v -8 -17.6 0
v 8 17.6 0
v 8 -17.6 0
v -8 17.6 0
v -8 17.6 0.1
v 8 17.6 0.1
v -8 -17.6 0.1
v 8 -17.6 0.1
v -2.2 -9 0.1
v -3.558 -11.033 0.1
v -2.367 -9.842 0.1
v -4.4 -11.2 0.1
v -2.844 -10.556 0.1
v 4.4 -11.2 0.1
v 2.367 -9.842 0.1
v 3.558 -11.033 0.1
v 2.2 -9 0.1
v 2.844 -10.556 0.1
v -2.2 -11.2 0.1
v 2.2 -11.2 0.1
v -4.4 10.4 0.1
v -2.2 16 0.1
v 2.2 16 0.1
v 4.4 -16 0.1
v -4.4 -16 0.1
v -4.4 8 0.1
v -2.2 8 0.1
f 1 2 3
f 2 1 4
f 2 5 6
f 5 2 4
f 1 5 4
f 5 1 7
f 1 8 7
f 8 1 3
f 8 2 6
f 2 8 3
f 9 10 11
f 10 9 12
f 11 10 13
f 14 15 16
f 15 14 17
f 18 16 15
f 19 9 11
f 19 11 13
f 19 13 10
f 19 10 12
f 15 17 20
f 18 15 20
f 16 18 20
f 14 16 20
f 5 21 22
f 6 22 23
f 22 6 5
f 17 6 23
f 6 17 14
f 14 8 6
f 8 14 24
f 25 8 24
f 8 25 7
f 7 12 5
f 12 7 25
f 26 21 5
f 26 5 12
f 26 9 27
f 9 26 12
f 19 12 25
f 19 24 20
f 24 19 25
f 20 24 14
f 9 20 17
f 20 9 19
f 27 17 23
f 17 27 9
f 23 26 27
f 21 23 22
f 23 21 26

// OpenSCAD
// file: ../p/4-4edge.scad
use <../lib.scad>
$fa=1; $fs=0.2;
function ldraw_lib__4_4edge(realsolid=false) = [
// 0 Circle 1.0
// 0 Name: 4-4edge.dat
// 0 Author: James Jessiman
// 0 !LDRAW_ORG Primitive UPDATE 2017-01
// 0 !LICENSE Licensed under CC BY 2.0 and CC BY 4.0 : see CAreadme.txt
// 
// 0 BFC CERTIFY CCW
  [0,"BFC","CERTIFY"],
  [0,"BFC","CCW"],
// 
// 0 !HISTORY 1998-12-15 [PTadmin] Official Update 1998-10
// 0 !HISTORY 2005-12-28 [PTadmin] Official Update 2005-01
// 0 !HISTORY 2007-06-24 [PTadmin] Header formatted for Contributor Agreement
// 0 !HISTORY 2008-07-01 [PTadmin] Official Update 2008-01
// 0 !HISTORY 2017-01-15 [Steffen] BFCed
// 0 !HISTORY 2017-12-30 [PTadmin] Official Update 2017-01
// 
// 
// 2 24 1 0 0 0.9239 0 0.3827
  [2,24,1,0,0,0.9239,0,0.3827],
// 2 24 0.9239 0 0.3827 0.7071 0 0.7071
  [2,24,0.9239,0,0.3827,0.7071,0,0.7071],
// 2 24 0.7071 0 0.7071 0.3827 0 0.9239
  [2,24,0.7071,0,0.7071,0.3827,0,0.9239],
// 2 24 0.3827 0 0.9239 0 0 1
  [2,24,0.3827,0,0.9239,0,0,1],
// 2 24 0 0 1 -0.3827 0 0.9239
  [2,24,0,0,1,-0.3827,0,0.9239],
// 2 24 -0.3827 0 0.9239 -0.7071 0 0.7071
  [2,24,-0.3827,0,0.9239,-0.7071,0,0.7071],
// 2 24 -0.7071 0 0.7071 -0.9239 0 0.3827
  [2,24,-0.7071,0,0.7071,-0.9239,0,0.3827],
// 2 24 -0.9239 0 0.3827 -1 0 -0
  [2,24,-0.9239,0,0.3827,-1,0,-0],
// 2 24 -1 0 -0 -0.9239 0 -0.3827
  [2,24,-1,0,-0,-0.9239,0,-0.3827],
// 2 24 -0.9239 0 -0.3827 -0.7071 0 -0.7071
  [2,24,-0.9239,0,-0.3827,-0.7071,0,-0.7071],
// 2 24 -0.7071 0 -0.7071 -0.3827 0 -0.9239
  [2,24,-0.7071,0,-0.7071,-0.3827,0,-0.9239],
// 2 24 -0.3827 0 -0.9239 0 0 -1
  [2,24,-0.3827,0,-0.9239,0,0,-1],
// 2 24 0 0 -1 0.3827 0 -0.9239
  [2,24,0,0,-1,0.3827,0,-0.9239],
// 2 24 0.3827 0 -0.9239 0.7071 0 -0.7071
  [2,24,0.3827,0,-0.9239,0.7071,0,-0.7071],
// 2 24 0.7071 0 -0.7071 0.9239 0 -0.3827
  [2,24,0.7071,0,-0.7071,0.9239,0,-0.3827],
// 2 24 0.9239 0 -0.3827 1 0 0
  [2,24,0.9239,0,-0.3827,1,0,0],
];
module ldraw_lib__4_4edge(step=0, col=false, unit=2/5, alt=false, line=0.2, solid=!$preview)
    makepoly(ldraw_lib__4_4edge(solid), step=step, col=col, unit=unit, alt=alt, line=line, solid=solid);
ldraw_lib__4_4edge(line=0.2);
// file: ../p/4-4disc.scad
use <../lib.scad>
$fa=1; $fs=0.2;
function ldraw_lib__4_4disc(realsolid=false) = [
// 0 Disc 1.0
// 0 Name: 4-4disc.dat
// 0 Author: James Jessiman
// 0 !LDRAW_ORG Primitive UPDATE 2002-02
// 0 !LICENSE Licensed under CC BY 2.0 and CC BY 4.0 : see CAreadme.txt
// 
// 0 BFC CERTIFY CCW
  [0,"BFC","CERTIFY"],
  [0,"BFC","CCW"],
// 
// 0 !HISTORY 1998-12-15 [PTadmin] Official Update 1998-10
// 0 !HISTORY 2002-03-23 [sbliss] Added BFC statement
// 0 !HISTORY 2002-04-25 [PTadmin] Official Update 2002-02
// 0 !HISTORY 2007-06-24 [PTadmin] Header formatted for Contributor Agreement
// 0 !HISTORY 2008-07-01 [PTadmin] Official Update 2008-01
// 
// 
// 3 16 0 0 0 1 0 0 0.9239 0 0.3827
  [3,16,0,0,0,1,0,0,0.9239,0,0.3827],
// 3 16 0 0 0 0.9239 0 0.3827 0.7071 0 0.7071
  [3,16,0,0,0,0.9239,0,0.3827,0.7071,0,0.7071],
// 3 16 0 0 0 0.7071 0 0.7071 0.3827 0 0.9239
  [3,16,0,0,0,0.7071,0,0.7071,0.3827,0,0.9239],
// 3 16 0 0 0 0.3827 0 0.9239 0 0 1
  [3,16,0,0,0,0.3827,0,0.9239,0,0,1],
// 3 16 0 0 0 0 0 1 -0.3827 0 0.9239
  [3,16,0,0,0,0,0,1,-0.3827,0,0.9239],
// 3 16 0 0 0 -0.3827 0 0.9239 -0.7071 0 0.7071
  [3,16,0,0,0,-0.3827,0,0.9239,-0.7071,0,0.7071],
// 3 16 0 0 0 -0.7071 0 0.7071 -0.9239 0 0.3827
  [3,16,0,0,0,-0.7071,0,0.7071,-0.9239,0,0.3827],
// 3 16 0 0 0 -0.9239 0 0.3827 -1 0 -0
  [3,16,0,0,0,-0.9239,0,0.3827,-1,0,-0],
// 3 16 0 0 0 -1 0 -0 -0.9239 0 -0.3827
  [3,16,0,0,0,-1,0,-0,-0.9239,0,-0.3827],
// 3 16 0 0 0 -0.9239 0 -0.3827 -0.7071 0 -0.7071
  [3,16,0,0,0,-0.9239,0,-0.3827,-0.7071,0,-0.7071],
// 3 16 0 0 0 -0.7071 0 -0.7071 -0.3827 0 -0.9239
  [3,16,0,0,0,-0.7071,0,-0.7071,-0.3827,0,-0.9239],
// 3 16 0 0 0 -0.3827 0 -0.9239 0 0 -1
  [3,16,0,0,0,-0.3827,0,-0.9239,0,0,-1],
// 3 16 0 0 0 0 0 -1 0.3827 0 -0.9239
  [3,16,0,0,0,0,0,-1,0.3827,0,-0.9239],
// 3 16 0 0 0 0.3827 0 -0.9239 0.7071 0 -0.7071
  [3,16,0,0,0,0.3827,0,-0.9239,0.7071,0,-0.7071],
// 3 16 0 0 0 0.7071 0 -0.7071 0.9239 0 -0.3827
  [3,16,0,0,0,0.7071,0,-0.7071,0.9239,0,-0.3827],
// 3 16 0 0 0 0.9239 0 -0.3827 1 0 0
  [3,16,0,0,0,0.9239,0,-0.3827,1,0,0],
// 0
];
module ldraw_lib__4_4disc(step=0, col=false, unit=2/5, alt=false, line=0.2, solid=!$preview)
    makepoly(ldraw_lib__4_4disc(solid), step=step, col=col, unit=unit, alt=alt, line=line, solid=solid);
ldraw_lib__4_4disc(line=0.2);
// file: ../p/4-4cyli.scad
use <../lib.scad>
$fa=1; $fs=0.2;
function ldraw_lib__4_4cyli(realsolid=false) = [
// 0 Cylinder 1.0
// 0 Name: 4-4cyli.dat
// 0 Author: James Jessiman
// 0 !LDRAW_ORG Primitive UPDATE 2005-01
// 0 !LICENSE Licensed under CC BY 2.0 and CC BY 4.0 : see CAreadme.txt
// 
// 0 BFC CERTIFY CCW
  [0,"BFC","CERTIFY"],
  [0,"BFC","CCW"],
// 
// 0 !HISTORY 1998-12-15 [PTadmin] Official Update 1998-10
// 0 !HISTORY 2002-03-23 [sbliss] Added BFC statement; merged headers from files in distributions LDraw 0.27 and Complete.
// 0 !HISTORY 2002-04-25 [PTadmin] Official Update 2002-02
// 0 !HISTORY 2004-12-14 [guyvivan] BFC CCW
// 0 !HISTORY 2005-12-28 [PTadmin] Official Update 2005-01
// 0 !HISTORY 2007-06-24 [PTadmin] Header formatted for Contributor Agreement
// 0 !HISTORY 2008-07-01 [PTadmin] Official Update 2008-01
// 
// 
// 4 16 1 1 0 0.9239 1 0.3827 0.9239 0 0.3827 1 0 0
  [4,16,1,1,0,0.9239,1,0.3827,0.9239,0,0.3827,1,0,0],
// 5 24 1 0 0 1 1 0 0.9239 0 0.3827 0.9239 0 -0.3827
  [5,24,1,0,0,1,1,0,0.9239,0,0.3827,0.9239,0,-0.3827],
// 4 16 0.9239 1 0.3827 0.7071 1 0.7071 0.7071 0 0.7071 0.9239 0 0.3827
  [4,16,0.9239,1,0.3827,0.7071,1,0.7071,0.7071,0,0.7071,0.9239,0,0.3827],
// 5 24 0.9239 0 0.3827 0.9239 1 0.3827 0.7071 0 0.7071 1 0 0
  [5,24,0.9239,0,0.3827,0.9239,1,0.3827,0.7071,0,0.7071,1,0,0],
// 4 16 0.7071 1 0.7071 0.3827 1 0.9239 0.3827 0 0.9239 0.7071 0 0.7071
  [4,16,0.7071,1,0.7071,0.3827,1,0.9239,0.3827,0,0.9239,0.7071,0,0.7071],
// 5 24 0.7071 0 0.7071 0.7071 1 0.7071 0.3827 0 0.9239 0.9239 0 0.3827
  [5,24,0.7071,0,0.7071,0.7071,1,0.7071,0.3827,0,0.9239,0.9239,0,0.3827],
// 4 16 0.3827 1 0.9239 0 1 1 0 0 1 0.3827 0 0.9239
  [4,16,0.3827,1,0.9239,0,1,1,0,0,1,0.3827,0,0.9239],
// 5 24 0.3827 0 0.9239 0.3827 1 0.9239 0 0 1 0.7071 0 0.7071
  [5,24,0.3827,0,0.9239,0.3827,1,0.9239,0,0,1,0.7071,0,0.7071],
// 4 16 0 1 1 -0.3827 1 0.9239 -0.3827 0 0.9239 0 0 1
  [4,16,0,1,1,-0.3827,1,0.9239,-0.3827,0,0.9239,0,0,1],
// 5 24 0 0 1 0 1 1 -0.3827 0 0.9239 0.3827 0 0.9239
  [5,24,0,0,1,0,1,1,-0.3827,0,0.9239,0.3827,0,0.9239],
// 4 16 -0.3827 1 0.9239 -0.7071 1 0.7071 -0.7071 0 0.7071 -0.3827 0 0.9239
  [4,16,-0.3827,1,0.9239,-0.7071,1,0.7071,-0.7071,0,0.7071,-0.3827,0,0.9239],
// 5 24 -0.3827 0 0.9239 -0.3827 1 0.9239 -0.7071 0 0.7071 0 0 1
  [5,24,-0.3827,0,0.9239,-0.3827,1,0.9239,-0.7071,0,0.7071,0,0,1],
// 4 16 -0.7071 1 0.7071 -0.9239 1 0.3827 -0.9239 0 0.3827 -0.7071 0 0.7071
  [4,16,-0.7071,1,0.7071,-0.9239,1,0.3827,-0.9239,0,0.3827,-0.7071,0,0.7071],
// 5 24 -0.7071 0 0.7071 -0.7071 1 0.7071 -0.9239 0 0.3827 -0.3827 0 0.9239
  [5,24,-0.7071,0,0.7071,-0.7071,1,0.7071,-0.9239,0,0.3827,-0.3827,0,0.9239],
// 4 16 -0.9239 1 0.3827 -1 1 0 -1 0 0 -0.9239 0 0.3827
  [4,16,-0.9239,1,0.3827,-1,1,0,-1,0,0,-0.9239,0,0.3827],
// 5 24 -0.9239 0 0.3827 -0.9239 1 0.3827 -1 0 0 -0.7071 0 0.7071
  [5,24,-0.9239,0,0.3827,-0.9239,1,0.3827,-1,0,0,-0.7071,0,0.7071],
// 4 16 -1 1 0 -0.9239 1 -0.3827 -0.9239 0 -0.3827 -1 0 0
  [4,16,-1,1,0,-0.9239,1,-0.3827,-0.9239,0,-0.3827,-1,0,0],
// 5 24 -1 0 0 -1 1 0 -0.9239 0 -0.3827 -0.9239 0 0.3827
  [5,24,-1,0,0,-1,1,0,-0.9239,0,-0.3827,-0.9239,0,0.3827],
// 4 16 -0.9239 1 -0.3827 -0.7071 1 -0.7071 -0.7071 0 -0.7071 -0.9239 0 -0.3827
  [4,16,-0.9239,1,-0.3827,-0.7071,1,-0.7071,-0.7071,0,-0.7071,-0.9239,0,-0.3827],
// 5 24 -0.9239 0 -0.3827 -0.9239 1 -0.3827 -0.7071 0 -0.7071 -1 0 0
  [5,24,-0.9239,0,-0.3827,-0.9239,1,-0.3827,-0.7071,0,-0.7071,-1,0,0],
// 4 16 -0.7071 1 -0.7071 -0.3827 1 -0.9239 -0.3827 0 -0.9239 -0.7071 0 -0.7071
  [4,16,-0.7071,1,-0.7071,-0.3827,1,-0.9239,-0.3827,0,-0.9239,-0.7071,0,-0.7071],
// 5 24 -0.7071 0 -0.7071 -0.7071 1 -0.7071 -0.3827 0 -0.9239 -0.9239 0 -0.3827
  [5,24,-0.7071,0,-0.7071,-0.7071,1,-0.7071,-0.3827,0,-0.9239,-0.9239,0,-0.3827],
// 4 16 -0.3827 1 -0.9239 0 1 -1 0 0 -1 -0.3827 0 -0.9239
  [4,16,-0.3827,1,-0.9239,0,1,-1,0,0,-1,-0.3827,0,-0.9239],
// 5 24 -0.3827 0 -0.9239 -0.3827 1 -0.9239 0 0 -1 -0.7071 0 -0.7071
  [5,24,-0.3827,0,-0.9239,-0.3827,1,-0.9239,0,0,-1,-0.7071,0,-0.7071],
// 4 16 0 1 -1 0.3827 1 -0.9239 0.3827 0 -0.9239 0 0 -1
  [4,16,0,1,-1,0.3827,1,-0.9239,0.3827,0,-0.9239,0,0,-1],
// 5 24 0 0 -1 0 1 -1 0.3827 0 -0.9239 -0.3827 0 -0.9239
  [5,24,0,0,-1,0,1,-1,0.3827,0,-0.9239,-0.3827,0,-0.9239],
// 4 16 0.3827 1 -0.9239 0.7071 1 -0.7071 0.7071 0 -0.7071 0.3827 0 -0.9239
  [4,16,0.3827,1,-0.9239,0.7071,1,-0.7071,0.7071,0,-0.7071,0.3827,0,-0.9239],
// 5 24 0.3827 0 -0.9239 0.3827 1 -0.9239 0.7071 0 -0.7071 0 0 -1
  [5,24,0.3827,0,-0.9239,0.3827,1,-0.9239,0.7071,0,-0.7071,0,0,-1],
// 4 16 0.7071 1 -0.7071 0.9239 1 -0.3827 0.9239 0 -0.3827 0.7071 0 -0.7071
  [4,16,0.7071,1,-0.7071,0.9239,1,-0.3827,0.9239,0,-0.3827,0.7071,0,-0.7071],
// 5 24 0.7071 0 -0.7071 0.7071 1 -0.7071 0.9239 0 -0.3827 0.3827 0 -0.9239
  [5,24,0.7071,0,-0.7071,0.7071,1,-0.7071,0.9239,0,-0.3827,0.3827,0,-0.9239],
// 4 16 0.9239 1 -0.3827 1 1 0 1 0 0 0.9239 0 -0.3827
  [4,16,0.9239,1,-0.3827,1,1,0,1,0,0,0.9239,0,-0.3827],
// 5 24 0.9239 0 -0.3827 0.9239 1 -0.3827 1 0 0 0.7071 0 -0.7071
  [5,24,0.9239,0,-0.3827,0.9239,1,-0.3827,1,0,0,0.7071,0,-0.7071],
// 0
];
module ldraw_lib__4_4cyli(step=0, col=false, unit=2/5, alt=false, line=0.2, solid=!$preview)
    makepoly(ldraw_lib__4_4cyli(solid), step=step, col=col, unit=unit, alt=alt, line=line, solid=solid);
ldraw_lib__4_4cyli(line=0.2);
// file: ../p/stud3.scad
use <../lib.scad>
use <4-4cyli.scad>
use <4-4disc.scad>
use <4-4edge.scad>
$fa=1; $fs=0.2;
function ldraw_lib__stud3(realsolid=false) = realsolid ? 
    [openscad(translate([0,0,-eps()], o=cylinder(4+eps(), r=4)),2)] : [
// 0 Stud Tube Solid
// 0 Name: stud3.dat
// 0 Author: James Jessiman
// 0 !LDRAW_ORG Primitive UPDATE 2012-01
// 0 !LICENSE Licensed under CC BY 2.0 and CC BY 4.0 : see CAreadme.txt
// 
// 0 BFC CERTIFY CCW
  [0,"BFC","CERTIFY"],
  [0,"BFC","CCW"],
// 
// 0 !HISTORY 2002-04-04 [sbliss] Modified for BFC compliance
// 0 !HISTORY 2002-04-25 [PTadmin] Official Update 2002-02
// 0 !HISTORY 2007-06-24 [PTadmin] Header formatted for Contributor Agreement
// 0 !HISTORY 2008-07-01 [PTadmin] Official Update 2008-01
// 0 !HISTORY 2012-02-16 [Philo] Changed to CCW
// 0 !HISTORY 2012-03-30 [PTadmin] Official Update 2012-01
// 
// 
// 1 16 0 -4 0 4 0 0 0 1 0 0 0 4 4-4edge.dat
  [1,16,0,-4,0,4,0,0,0,1,0,0,0,4, ldraw_lib__4_4edge(realsolid)],
// 1 16 0 0 0 4 0 0 0 1 0 0 0 4 4-4edge.dat
  [1,16,0,0,0,4,0,0,0,1,0,0,0,4, ldraw_lib__4_4edge(realsolid)],
// 1 16 0 -4 0 4 0 0 0 1 0 0 0 4 4-4disc.dat
  [1,16,0,-4,0,4,0,0,0,1,0,0,0,4, ldraw_lib__4_4disc(realsolid)],
// 1 16 0 -4 0 4 0 0 0 4 0 0 0 4 4-4cyli.dat
  [1,16,0,-4,0,4,0,0,0,4,0,0,0,4, ldraw_lib__4_4cyli(realsolid)],
];
module ldraw_lib__stud3(step=0, col=false, unit=2/5, alt=false, line=0.2, solid=!$preview)
    makepoly(ldraw_lib__stud3(solid), step=step, col=col, unit=unit, alt=alt, line=line, solid=solid);
ldraw_lib__stud3(line=0.2);
// file: ../p/stud.scad
use <../lib.scad>
use <4-4cyli.scad>
use <4-4disc.scad>
use <4-4edge.scad>
$fa=1; $fs=0.2;
function ldraw_lib__stud(realsolid=false) = realsolid ? 
    [openscad(translate([0,0,-eps()], o=cylinder(4+eps(), r=6)),2)] : [
// 0 Stud
// 0 Name: stud.dat
// 0 Author: James Jessiman
// 0 !LDRAW_ORG Primitive UPDATE 2012-01
// 0 !LICENSE Licensed under CC BY 2.0 and CC BY 4.0 : see CAreadme.txt
// 
// 0 BFC CERTIFY CCW
  [0,"BFC","CERTIFY"],
  [0,"BFC","CCW"],
// 
// 0 !HISTORY 2002-04-04 [sbliss] Modified for BFC compliance
// 0 !HISTORY 2002-04-25 [PTadmin] Official Update 2002-02
// 0 !HISTORY 2007-06-24 [PTadmin] Header formatted for Contributor Agreement
// 0 !HISTORY 2008-07-01 [PTadmin] Official Update 2008-01
// 0 !HISTORY 2012-02-16 [Philo] Changed to CCW
// 0 !HISTORY 2012-03-30 [PTadmin] Official Update 2012-01
// 
// 
// 1 16 0 0 0 6 0 0 0 1 0 0 0 6 4-4edge.dat
  [1,16,0,0,0,6,0,0,0,1,0,0,0,6, ldraw_lib__4_4edge(realsolid)],
// 1 16 0 -4 0 6 0 0 0 1 0 0 0 6 4-4edge.dat
  [1,16,0,-4,0,6,0,0,0,1,0,0,0,6, ldraw_lib__4_4edge(realsolid)],
// 1 16 0 0 0 6 0 0 0 -4 0 0 0 6 4-4cyli.dat
  [1,16,0,0,0,6,0,0,0,-4,0,0,0,6, ldraw_lib__4_4cyli(realsolid)],
// 1 16 0 -4 0 6 0 0 0 1 0 0 0 6 4-4disc.dat
  [1,16,0,-4,0,6,0,0,0,1,0,0,0,6, ldraw_lib__4_4disc(realsolid)],
];
module ldraw_lib__stud(step=0, col=false, unit=2/5, alt=false, line=0.2, solid=!$preview)
    makepoly(ldraw_lib__stud(solid), step=step, col=col, unit=unit, alt=alt, line=line, solid=solid);
ldraw_lib__stud(line=0.2);
// file: ../p/box5.scad
use <../lib.scad>
$fa=1; $fs=0.2;
function ldraw_lib__box5(realsolid=false) = [
// 0 Box with 5 Faces and All Edges
// 0 Name: box5.dat
// 0 Author: James Jessiman
// 0 !LDRAW_ORG Primitive UPDATE 2012-01
// 0 !LICENSE Licensed under CC BY 2.0 and CC BY 4.0 : see CAreadme.txt
// 
// 0 BFC CERTIFY CCW
  [0,"BFC","CERTIFY"],
  [0,"BFC","CCW"],
// 
// 0 !HISTORY 2002-04-03 [sbliss] Modified for BFC compliance
// 0 !HISTORY 2002-04-25 [PTadmin] Official Update 2002-02
// 0 !HISTORY 2007-06-24 [PTadmin] Header formatted for Contributor Agreement
// 0 !HISTORY 2008-07-01 [PTadmin] Official Update 2008-01
// 0 !HISTORY 2012-02-16 [Philo] Changed to CCW
// 0 !HISTORY 2012-03-30 [PTadmin] Official Update 2012-01
// 
// 
// 2 24 1 1 1 -1 1 1
  [2,24,1,1,1,-1,1,1],
// 2 24 -1 1 1 -1 1 -1
  [2,24,-1,1,1,-1,1,-1],
// 2 24 -1 1 -1 1 1 -1
  [2,24,-1,1,-1,1,1,-1],
// 2 24 1 1 -1 1 1 1
  [2,24,1,1,-1,1,1,1],
// 2 24 1 0 1 -1 0 1
  [2,24,1,0,1,-1,0,1],
// 2 24 -1 0 1 -1 0 -1
  [2,24,-1,0,1,-1,0,-1],
// 2 24 -1 0 -1 1 0 -1
  [2,24,-1,0,-1,1,0,-1],
// 2 24 1 0 -1 1 0 1
  [2,24,1,0,-1,1,0,1],
// 2 24 1 0 1 1 1 1
  [2,24,1,0,1,1,1,1],
// 2 24 -1 0 1 -1 1 1
  [2,24,-1,0,1,-1,1,1],
// 2 24 1 0 -1 1 1 -1
  [2,24,1,0,-1,1,1,-1],
// 2 24 -1 0 -1 -1 1 -1
  [2,24,-1,0,-1,-1,1,-1],
// 4 16 -1 1 1 1 1 1 1 1 -1 -1 1 -1
  [4,16,-1,1,1,1,1,1,1,1,-1,-1,1,-1],
// 4 16 -1 1 1 -1 0 1 1 0 1 1 1 1
  [4,16,-1,1,1,-1,0,1,1,0,1,1,1,1],
// 4 16 -1 1 -1 -1 0 -1 -1 0 1 -1 1 1
  [4,16,-1,1,-1,-1,0,-1,-1,0,1,-1,1,1],
// 4 16 1 1 -1 1 0 -1 -1 0 -1 -1 1 -1
  [4,16,1,1,-1,1,0,-1,-1,0,-1,-1,1,-1],
// 4 16 1 1 1 1 0 1 1 0 -1 1 1 -1
  [4,16,1,1,1,1,0,1,1,0,-1,1,1,-1],
];
module ldraw_lib__box5(step=0, col=false, unit=2/5, alt=false, line=0.2, solid=!$preview)
    makepoly(ldraw_lib__box5(solid), step=step, col=col, unit=unit, alt=alt, line=line, solid=solid);
ldraw_lib__box5(line=0.2);
// file: ../p/box4t.scad
use <../lib.scad>
$fa=1; $fs=0.2;
function ldraw_lib__box4t(realsolid=false) = [
// 0 Box with 4 Adjacent Faces and All Edges
// 0 Name: box4t.dat
// 0 Author: Tore Eriksson [Tore_Eriksson]
// 0 !LDRAW_ORG Primitive UPDATE 2003-02
// 0 !LICENSE Licensed under CC BY 2.0 and CC BY 4.0 : see CAreadme.txt
// 
// 0 BFC CERTIFY CCW
  [0,"BFC","CERTIFY"],
  [0,"BFC","CCW"],
// 
// 0 !HISTORY 1997-09-29 [PTadmin] Official Update 1997-15
// 0 !HISTORY 2002-08-31 [izanette] Modified with WINDZ for BFC compliance
// 0 !HISTORY 2003-08-01 [PTadmin] Official Update 2003-02
// 0 !HISTORY 2007-06-24 [PTadmin] Header formatted for Contributor Agreement
// 0 !HISTORY 2008-07-01 [PTadmin] Official Update 2008-01
// 
// 
// 2 24 1 1 1 -1 1 1
  [2,24,1,1,1,-1,1,1],
// 2 24 -1 1 1 -1 1 -1
  [2,24,-1,1,1,-1,1,-1],
// 2 24 -1 1 -1 1 1 -1
  [2,24,-1,1,-1,1,1,-1],
// 2 24 1 1 -1 1 1 1
  [2,24,1,1,-1,1,1,1],
// 2 24 1 0 1 -1 0 1
  [2,24,1,0,1,-1,0,1],
// 2 24 -1 0 1 -1 0 -1
  [2,24,-1,0,1,-1,0,-1],
// 2 24 -1 0 -1 1 0 -1
  [2,24,-1,0,-1,1,0,-1],
// 2 24 1 0 -1 1 0 1
  [2,24,1,0,-1,1,0,1],
// 2 24 1 0 1 1 1 1
  [2,24,1,0,1,1,1,1],
// 2 24 -1 0 1 -1 1 1
  [2,24,-1,0,1,-1,1,1],
// 2 24 1 0 -1 1 1 -1
  [2,24,1,0,-1,1,1,-1],
// 2 24 -1 0 -1 -1 1 -1
  [2,24,-1,0,-1,-1,1,-1],
// 4 16 1 1 1 1 1 -1 -1 1 -1 -1 1 1
  [4,16,1,1,1,1,1,-1,-1,1,-1,-1,1,1],
// 4 16 1 1 1 -1 1 1 -1 0 1 1 0 1
  [4,16,1,1,1,-1,1,1,-1,0,1,1,0,1],
// 4 16 -1 1 1 -1 1 -1 -1 0 -1 -1 0 1
  [4,16,-1,1,1,-1,1,-1,-1,0,-1,-1,0,1],
// 0 4 16 -1 1 -1 -1 0 -1 1 0 -1 1 1 -1
// 4 16 1 1 -1 1 1 1 1 0 1 1 0 -1
  [4,16,1,1,-1,1,1,1,1,0,1,1,0,-1],
// 0
];
module ldraw_lib__box4t(step=0, col=false, unit=2/5, alt=false, line=0.2, solid=!$preview)
    makepoly(ldraw_lib__box4t(solid), step=step, col=col, unit=unit, alt=alt, line=line, solid=solid);
ldraw_lib__box4t(line=0.2);
// file: s/3004s01.scad
use <../../lib.scad>
use <../../p/box4t.scad>
use <../../p/box5.scad>
use <../../p/stud.scad>
use <../../p/stud3.scad>
$fa=1; $fs=0.2;
function ldraw_lib__s__3004s01(realsolid=false) = [
// 0 ~Brick  1 x  2 without Front Face
// 0 Name: s\3004s01.dat
// 0 Author: James Jessiman
// 0 !LDRAW_ORG Subpart UPDATE 2003-03
// 0 !LICENSE Licensed under CC BY 2.0 and CC BY 4.0 : see CAreadme.txt
// 
// 0 BFC CERTIFY CCW
  [0,"BFC","CERTIFY"],
  [0,"BFC","CCW"],
// 
// 0 !HISTORY 2003-09-07 [jriley] Subfiling, BFC
// 0 !HISTORY 2003-12-19 [PTadmin] Official Update 2003-03
// 0 !HISTORY 2007-08-29 [PTadmin] Header formatted for Contributor Agreement
// 0 !HISTORY 2008-07-01 [PTadmin] Official Update 2008-01
// 
// 
// 1 16 0 4 0 1 0 0 0 -5 0 0 0 1 stud3.dat
  [1,16,0,4,0,1,0,0,0,-5,0,0,0,1, ldraw_lib__stud3(realsolid)],
// 0 BFC INVERTNEXT
  [0,"BFC","INVERTNEXT"],
// 1 16 0 24 0 16 0 0 0 -20 0 0 0 6 box5.dat
  [1,16,0,24,0,16,0,0,0,-20,0,0,0,6, ldraw_lib__box5(realsolid)],
// 4 16 20 24 10 16 24 6 -16 24 6 -20 24 10
  [4,16,20,24,10,16,24,6,-16,24,6,-20,24,10],
// 4 16 -20 24 10 -16 24 6 -16 24 -6 -20 24 -10
  [4,16,-20,24,10,-16,24,6,-16,24,-6,-20,24,-10],
// 4 16 -20 24 -10 -16 24 -6 16 24 -6 20 24 -10
  [4,16,-20,24,-10,-16,24,-6,16,24,-6,20,24,-10],
// 4 16 20 24 -10 16 24 -6 16 24 6 20 24 10
  [4,16,20,24,-10,16,24,-6,16,24,6,20,24,10],
// 1 16 0 24 0 20 0 0 0 -24 0 0 0 10 box4t.dat
  [1,16,0,24,0,20,0,0,0,-24,0,0,0,10, ldraw_lib__box4t(realsolid)],
// 1 16 10 0 0 1 0 0 0 1 0 0 0 1 stud.dat
  [1,16,10,0,0,1,0,0,0,1,0,0,0,1, ldraw_lib__stud(realsolid)],
// 1 16 -10 0 0 1 0 0 0 1 0 0 0 1 stud.dat
  [1,16,-10,0,0,1,0,0,0,1,0,0,0,1, ldraw_lib__stud(realsolid)],
// 0
];
module ldraw_lib__s__3004s01(step=0, col=false, unit=2/5, alt=false, line=0.2, solid=!$preview)
    makepoly(ldraw_lib__s__3004s01(solid), step=step, col=col, unit=unit, alt=alt, line=line, solid=solid);
ldraw_lib__s__3004s01(line=0.2);
// file: 3004.scad
use <../lib.scad>
use <s/3004s01.scad>
$fa=1; $fs=0.2;
function ldraw_lib__3004(realsolid=false) = [
// 0 Brick  1 x  2
// 0 Name: 3004.dat
// 0 Author: James Jessiman
// 0 !LDRAW_ORG Part UPDATE 2022-05
// 0 !LICENSE Licensed under CC BY 2.0 and CC BY 4.0 : see CAreadme.txt
// 
// 0 BFC CERTIFY CCW
  [0,"BFC","CERTIFY"],
  [0,"BFC","CCW"],
// 
// 0 !HISTORY 2001-10-26 [PTadmin] Official Update 2001-01
// 0 !HISTORY 2002-05-07 {unknown} BFC Certification
// 0 !HISTORY 2002-06-11 [PTadmin] Official Update 2002-03
// 0 !HISTORY 2007-05-07 [PTadmin] Header formatted for Contributor Agreement
// 0 !HISTORY 2008-07-01 [PTadmin] Official Update 2008-01
// 0 !HISTORY 2022-08-04 [MagFors] Using subfile
// 0 !HISTORY 2022-09-15 [PTadmin] Official Update 2022-05
// 
// 
// 1 16 0 0 0 1 0 0 0 1 0 0 0 1 s\3004s01.dat
  [1,16,0,0,0,1,0,0,0,1,0,0,0,1, ldraw_lib__s__3004s01(realsolid)],
// 4 16 -20 24 -10 20 24 -10 20 0 -10 -20 0 -10
  [4,16,-20,24,-10,20,24,-10,20,0,-10,-20,0,-10],
];
module ldraw_lib__3004(step=0, col=false, unit=2/5, alt=false, line=0.2, solid=!$preview)
    makepoly(ldraw_lib__3004(solid), step=step, col=col, unit=unit, alt=alt, line=line, solid=solid);
ldraw_lib__3004(line=0.2);
// file: ../p/box5-12.scad
use <../lib.scad>
$fa=1; $fs=0.2;
function ldraw_lib__box5_12(realsolid=false) = [
// 0 Box with 5 Faces without Any Edges
// 0 Name: box5-12.dat
// 0 Author: Chris Dee [cwdee]
// 0 !LDRAW_ORG Primitive UPDATE 2009-02
// 0 !LICENSE Licensed under CC BY 2.0 and CC BY 4.0 : see CAreadme.txt
// 
// 0 BFC CERTIFY CCW
  [0,"BFC","CERTIFY"],
  [0,"BFC","CCW"],
// 
// 0 !HISTORY 2009-09-03 [PTadmin] Official Update 2009-02
// 
// 
// 4 16 1 1 1 1 1 -1 -1 1 -1 -1 1 1
  [4,16,1,1,1,1,1,-1,-1,1,-1,-1,1,1],
// 4 16 -1 0 1 1 0 1 1 1 1 -1 1 1
  [4,16,-1,0,1,1,0,1,1,1,1,-1,1,1],
// 4 16 -1 0 -1 -1 0 1 -1 1 1 -1 1 -1
  [4,16,-1,0,-1,-1,0,1,-1,1,1,-1,1,-1],
// 4 16 1 0 -1 -1 0 -1 -1 1 -1 1 1 -1
  [4,16,1,0,-1,-1,0,-1,-1,1,-1,1,1,-1],
// 4 16 1 0 1 1 0 -1 1 1 -1 1 1 1
  [4,16,1,0,1,1,0,-1,1,1,-1,1,1,1],
// 0
];
module ldraw_lib__box5_12(step=0, col=false, unit=2/5, alt=false, line=0.2, solid=!$preview)
    makepoly(ldraw_lib__box5_12(solid), step=step, col=col, unit=unit, alt=alt, line=line, solid=solid);
ldraw_lib__box5_12(line=0.2);
// file: ../p/1-4ndis.scad
use <../lib.scad>
$fa=1; $fs=0.2;
function ldraw_lib__1_4ndis(realsolid=false) = [
// 0 Disc Negative 0.25
// 0 Name: 1-4ndis.dat
// 0 Author: James Jessiman
// 0 !LDRAW_ORG Primitive UPDATE 2012-01
// 0 !LICENSE Licensed under CC BY 2.0 and CC BY 4.0 : see CAreadme.txt
// 
// 0 BFC CERTIFY CCW
  [0,"BFC","CERTIFY"],
  [0,"BFC","CCW"],
// 
// 0 !HISTORY 2002-03-23 [sbliss] Added BFC Statement
// 0 !HISTORY 2002-04-25 [PTadmin] Official Update 2002-02
// 0 !HISTORY 2007-06-22 [PTadmin] Header formatted for Contributor Agreement
// 0 !HISTORY 2008-07-01 [PTadmin] Official Update 2008-01
// 0 !HISTORY 2012-02-16 [Philo] Changed to CCW
// 0 !HISTORY 2012-03-30 [PTadmin] Official Update 2012-01
// 
// 
// 3 16 0.9239 0 0.3827 1 0 0 1 0 1
  [3,16,0.9239,0,0.3827,1,0,0,1,0,1],
// 3 16 0.7071 0 0.7071 0.9239 0 0.3827 1 0 1
  [3,16,0.7071,0,0.7071,0.9239,0,0.3827,1,0,1],
// 3 16 0.3827 0 0.9239 0.7071 0 0.7071 1 0 1
  [3,16,0.3827,0,0.9239,0.7071,0,0.7071,1,0,1],
// 3 16 0 0 1 0.3827 0 0.9239 1 0 1
  [3,16,0,0,1,0.3827,0,0.9239,1,0,1],
];
module ldraw_lib__1_4ndis(step=0, col=false, unit=2/5, alt=false, line=0.2, solid=!$preview)
    makepoly(ldraw_lib__1_4ndis(solid), step=step, col=col, unit=unit, alt=alt, line=line, solid=solid);
ldraw_lib__1_4ndis(line=0.2);
// file: ../p/1-4chrd.scad
use <../lib.scad>
$fa=1; $fs=0.2;
function ldraw_lib__1_4chrd(realsolid=false) = [
// 0 Chord 0.25
// 0 Name: 1-4chrd.dat
// 0 Author: Tony Hafner [hafhead]
// 0 !LDRAW_ORG Primitive UPDATE 2012-02
// 0 !LICENSE Licensed under CC BY 2.0 and CC BY 4.0 : see CAreadme.txt
// 
// 0 BFC CERTIFY CCW
  [0,"BFC","CERTIFY"],
  [0,"BFC","CCW"],
// 
// 0 !HISTORY 2004-04-22 [PTadmin] Official Update 2004-02
// 0 !HISTORY 2007-10-09 [PTadmin] Header formatted for Contributor Agreement
// 0 !HISTORY 2008-07-01 [PTadmin] Official Update 2008-01
// 0 !HISTORY 2012-08-02 [MMR1988] Re-creation with PrimGen2 and Rectifier
// 0 !HISTORY 2012-08-09 [PTadmin] Official Update 2012-02
// 
// 
// 4 16 0.9239 0 0.3827 0.3827 0 0.9239 0 0 1 1 0 0
  [4,16,0.9239,0,0.3827,0.3827,0,0.9239,0,0,1,1,0,0],
// 3 16 0.7071 0 0.7071 0.3827 0 0.9239 0.9239 0 0.3827
  [3,16,0.7071,0,0.7071,0.3827,0,0.9239,0.9239,0,0.3827],
];
module ldraw_lib__1_4chrd(step=0, col=false, unit=2/5, alt=false, line=0.2, solid=!$preview)
    makepoly(ldraw_lib__1_4chrd(solid), step=step, col=col, unit=unit, alt=alt, line=line, solid=solid);
ldraw_lib__1_4chrd(line=0.2);
// main file
use <../lib.scad>
use <../p/1-4chrd.scad>
use <../p/1-4ndis.scad>
use <../p/box5-12.scad>
$fa=1; $fs=0.2;
function ldraw_lib__4162510c(realsolid=false) = [
// 0 Sticker  4.4 x  2.0 with White "1" on Light Grey Background
// 0 Name: 4162510c.dat
// 0 Author: Massimo Maso [Sirio]
// 0 !LDRAW_ORG Part UPDATE 2022-06
// 0 !LICENSE Licensed under CC BY 2.0 and CC BY 4.0 : see CAreadme.txt
// 
// 0 BFC CERTIFY CCW
  [0,"BFC","CERTIFY"],
  [0,"BFC","CCW"],
// 
// 0 !KEYWORDS Biplane, Camel, Sculptures, Set 3451, Sopwith
// 
// 0 !HISTORY 2022-12-20 [PTadmin] Official Update 2022-06
// 
// 
// 0 // Primitives
// 1 16 0 -.25 0 20 0 0 0 .25 0 0 0 44 box5-12.dat
  [1,16,0,-.25,0,20,0,0,0,.25,0,0,0,44, ldraw_lib__box5_12(realsolid)],
// 1 7 -11 -.25 -22.5 5.5 0 0 0 1 0 0 0 -5.5 1-4chrd.dat
  [1,7,-11,-.25,-22.5,5.5,0,0,0,1,0,0,0,-5.5, ldraw_lib__1_4chrd(realsolid)],
// 1 7 11 -.25 -22.5 -5.5 0 0 0 1 0 0 0 -5.5 1-4chrd.dat
  [1,7,11,-.25,-22.5,-5.5,0,0,0,1,0,0,0,-5.5, ldraw_lib__1_4chrd(realsolid)],
// 1 15 -11 -.25 -22.5 5.5 0 0 0 1 0 0 0 -5.5 1-4ndis.dat
  [1,15,-11,-.25,-22.5,5.5,0,0,0,1,0,0,0,-5.5, ldraw_lib__1_4ndis(realsolid)],
// 1 15 11 -.25 -22.5 -5.5 0 0 0 1 0 0 0 -5.5 1-4ndis.dat
  [1,15,11,-.25,-22.5,-5.5,0,0,0,1,0,0,0,-5.5, ldraw_lib__1_4ndis(realsolid)],
// 0 // Top faces
// 0 // Grey faces
// 3 7 -20 -.25 44 -11 -.25 26 -5.5 -.25 40
  [3,7,-20,-.25,44,-11,-.25,26,-5.5,-.25,40],
// 4 7 -20 -.25 44 -5.5 -.25 40 5.5 -.25 40 20 -.25 44
  [4,7,-20,-.25,44,-5.5,-.25,40,5.5,-.25,40,20,-.25,44],
// 4 7 20 -.25 44 5.5 -.25 40 5.5 -.25 -22.5 11 -.25 -28
  [4,7,20,-.25,44,5.5,-.25,40,5.5,-.25,-22.5,11,-.25,-28],
// 4 7 20 -.25 44 11 -.25 -28 11 -.25 -40 20 -.25 -44
  [4,7,20,-.25,44,11,-.25,-28,11,-.25,-40,20,-.25,-44],
// 4 7 -20 -.25 -44 20 -.25 -44 11 -.25 -40 -11 -.25 -40
  [4,7,-20,-.25,-44,20,-.25,-44,11,-.25,-40,-11,-.25,-40],
// 4 7 -20 -.25 -44 -11 -.25 -40 -11 -.25 -28 -20 -.25 44
  [4,7,-20,-.25,-44,-11,-.25,-40,-11,-.25,-28,-20,-.25,44],
// 3 7 -11 -.25 20 -11 -.25 26 -20 -.25 44
  [3,7,-11,-.25,20,-11,-.25,26,-20,-.25,44],
// 3 7 -11 -.25 20 -20 -.25 44 -11 -.25 -28
  [3,7,-11,-.25,20,-20,-.25,44,-11,-.25,-28],
// 4 7 -11 -.25 20 -11 -.25 -28 -5.5 -.25 -22.5 -5.5 -.25 20
  [4,7,-11,-.25,20,-11,-.25,-28,-5.5,-.25,-22.5,-5.5,-.25,20],
// 0 // White faces
// 3 15 -5.5 -.25 -28 -11 -.25 -28 -11 -.25 -40
  [3,15,-5.5,-.25,-28,-11,-.25,-28,-11,-.25,-40],
// 4 15 -5.5 -.25 -28 -11 -.25 -40 11 -.25 -40 5.5 -.25 -28
  [4,15,-5.5,-.25,-28,-11,-.25,-40,11,-.25,-40,5.5,-.25,-28],
// 3 15 5.5 -.25 -28 11 -.25 -40 11 -.25 -28
  [3,15,5.5,-.25,-28,11,-.25,-40,11,-.25,-28],
// 4 15 5.5 -.25 -28 5.5 -.25 -22.5 -5.5 -.25 -22.5 -5.5 -.25 -28
  [4,15,5.5,-.25,-28,5.5,-.25,-22.5,-5.5,-.25,-22.5,-5.5,-.25,-28],
// 4 15 5.5 -.25 40 -5.5 -.25 20 -5.5 -.25 -22.5 5.5 -.25 -22.5
  [4,15,5.5,-.25,40,-5.5,-.25,20,-5.5,-.25,-22.5,5.5,-.25,-22.5],
// 3 15 5.5 -.25 40 -11 -.25 20 -5.5 -.25 20
  [3,15,5.5,-.25,40,-11,-.25,20,-5.5,-.25,20],
// 4 15 5.5 -.25 40 -5.5 -.25 40 -11 -.25 26 -11 -.25 20
  [4,15,5.5,-.25,40,-5.5,-.25,40,-11,-.25,26,-11,-.25,20],
];
module ldraw_lib__4162510c(step=0, col=false, unit=2/5, alt=false, line=0.2, solid=!$preview)
    makepoly(ldraw_lib__4162510c(solid), step=step, col=col, unit=unit, alt=alt, line=line, solid=solid);
ldraw_lib__4162510c(line=0.2);
